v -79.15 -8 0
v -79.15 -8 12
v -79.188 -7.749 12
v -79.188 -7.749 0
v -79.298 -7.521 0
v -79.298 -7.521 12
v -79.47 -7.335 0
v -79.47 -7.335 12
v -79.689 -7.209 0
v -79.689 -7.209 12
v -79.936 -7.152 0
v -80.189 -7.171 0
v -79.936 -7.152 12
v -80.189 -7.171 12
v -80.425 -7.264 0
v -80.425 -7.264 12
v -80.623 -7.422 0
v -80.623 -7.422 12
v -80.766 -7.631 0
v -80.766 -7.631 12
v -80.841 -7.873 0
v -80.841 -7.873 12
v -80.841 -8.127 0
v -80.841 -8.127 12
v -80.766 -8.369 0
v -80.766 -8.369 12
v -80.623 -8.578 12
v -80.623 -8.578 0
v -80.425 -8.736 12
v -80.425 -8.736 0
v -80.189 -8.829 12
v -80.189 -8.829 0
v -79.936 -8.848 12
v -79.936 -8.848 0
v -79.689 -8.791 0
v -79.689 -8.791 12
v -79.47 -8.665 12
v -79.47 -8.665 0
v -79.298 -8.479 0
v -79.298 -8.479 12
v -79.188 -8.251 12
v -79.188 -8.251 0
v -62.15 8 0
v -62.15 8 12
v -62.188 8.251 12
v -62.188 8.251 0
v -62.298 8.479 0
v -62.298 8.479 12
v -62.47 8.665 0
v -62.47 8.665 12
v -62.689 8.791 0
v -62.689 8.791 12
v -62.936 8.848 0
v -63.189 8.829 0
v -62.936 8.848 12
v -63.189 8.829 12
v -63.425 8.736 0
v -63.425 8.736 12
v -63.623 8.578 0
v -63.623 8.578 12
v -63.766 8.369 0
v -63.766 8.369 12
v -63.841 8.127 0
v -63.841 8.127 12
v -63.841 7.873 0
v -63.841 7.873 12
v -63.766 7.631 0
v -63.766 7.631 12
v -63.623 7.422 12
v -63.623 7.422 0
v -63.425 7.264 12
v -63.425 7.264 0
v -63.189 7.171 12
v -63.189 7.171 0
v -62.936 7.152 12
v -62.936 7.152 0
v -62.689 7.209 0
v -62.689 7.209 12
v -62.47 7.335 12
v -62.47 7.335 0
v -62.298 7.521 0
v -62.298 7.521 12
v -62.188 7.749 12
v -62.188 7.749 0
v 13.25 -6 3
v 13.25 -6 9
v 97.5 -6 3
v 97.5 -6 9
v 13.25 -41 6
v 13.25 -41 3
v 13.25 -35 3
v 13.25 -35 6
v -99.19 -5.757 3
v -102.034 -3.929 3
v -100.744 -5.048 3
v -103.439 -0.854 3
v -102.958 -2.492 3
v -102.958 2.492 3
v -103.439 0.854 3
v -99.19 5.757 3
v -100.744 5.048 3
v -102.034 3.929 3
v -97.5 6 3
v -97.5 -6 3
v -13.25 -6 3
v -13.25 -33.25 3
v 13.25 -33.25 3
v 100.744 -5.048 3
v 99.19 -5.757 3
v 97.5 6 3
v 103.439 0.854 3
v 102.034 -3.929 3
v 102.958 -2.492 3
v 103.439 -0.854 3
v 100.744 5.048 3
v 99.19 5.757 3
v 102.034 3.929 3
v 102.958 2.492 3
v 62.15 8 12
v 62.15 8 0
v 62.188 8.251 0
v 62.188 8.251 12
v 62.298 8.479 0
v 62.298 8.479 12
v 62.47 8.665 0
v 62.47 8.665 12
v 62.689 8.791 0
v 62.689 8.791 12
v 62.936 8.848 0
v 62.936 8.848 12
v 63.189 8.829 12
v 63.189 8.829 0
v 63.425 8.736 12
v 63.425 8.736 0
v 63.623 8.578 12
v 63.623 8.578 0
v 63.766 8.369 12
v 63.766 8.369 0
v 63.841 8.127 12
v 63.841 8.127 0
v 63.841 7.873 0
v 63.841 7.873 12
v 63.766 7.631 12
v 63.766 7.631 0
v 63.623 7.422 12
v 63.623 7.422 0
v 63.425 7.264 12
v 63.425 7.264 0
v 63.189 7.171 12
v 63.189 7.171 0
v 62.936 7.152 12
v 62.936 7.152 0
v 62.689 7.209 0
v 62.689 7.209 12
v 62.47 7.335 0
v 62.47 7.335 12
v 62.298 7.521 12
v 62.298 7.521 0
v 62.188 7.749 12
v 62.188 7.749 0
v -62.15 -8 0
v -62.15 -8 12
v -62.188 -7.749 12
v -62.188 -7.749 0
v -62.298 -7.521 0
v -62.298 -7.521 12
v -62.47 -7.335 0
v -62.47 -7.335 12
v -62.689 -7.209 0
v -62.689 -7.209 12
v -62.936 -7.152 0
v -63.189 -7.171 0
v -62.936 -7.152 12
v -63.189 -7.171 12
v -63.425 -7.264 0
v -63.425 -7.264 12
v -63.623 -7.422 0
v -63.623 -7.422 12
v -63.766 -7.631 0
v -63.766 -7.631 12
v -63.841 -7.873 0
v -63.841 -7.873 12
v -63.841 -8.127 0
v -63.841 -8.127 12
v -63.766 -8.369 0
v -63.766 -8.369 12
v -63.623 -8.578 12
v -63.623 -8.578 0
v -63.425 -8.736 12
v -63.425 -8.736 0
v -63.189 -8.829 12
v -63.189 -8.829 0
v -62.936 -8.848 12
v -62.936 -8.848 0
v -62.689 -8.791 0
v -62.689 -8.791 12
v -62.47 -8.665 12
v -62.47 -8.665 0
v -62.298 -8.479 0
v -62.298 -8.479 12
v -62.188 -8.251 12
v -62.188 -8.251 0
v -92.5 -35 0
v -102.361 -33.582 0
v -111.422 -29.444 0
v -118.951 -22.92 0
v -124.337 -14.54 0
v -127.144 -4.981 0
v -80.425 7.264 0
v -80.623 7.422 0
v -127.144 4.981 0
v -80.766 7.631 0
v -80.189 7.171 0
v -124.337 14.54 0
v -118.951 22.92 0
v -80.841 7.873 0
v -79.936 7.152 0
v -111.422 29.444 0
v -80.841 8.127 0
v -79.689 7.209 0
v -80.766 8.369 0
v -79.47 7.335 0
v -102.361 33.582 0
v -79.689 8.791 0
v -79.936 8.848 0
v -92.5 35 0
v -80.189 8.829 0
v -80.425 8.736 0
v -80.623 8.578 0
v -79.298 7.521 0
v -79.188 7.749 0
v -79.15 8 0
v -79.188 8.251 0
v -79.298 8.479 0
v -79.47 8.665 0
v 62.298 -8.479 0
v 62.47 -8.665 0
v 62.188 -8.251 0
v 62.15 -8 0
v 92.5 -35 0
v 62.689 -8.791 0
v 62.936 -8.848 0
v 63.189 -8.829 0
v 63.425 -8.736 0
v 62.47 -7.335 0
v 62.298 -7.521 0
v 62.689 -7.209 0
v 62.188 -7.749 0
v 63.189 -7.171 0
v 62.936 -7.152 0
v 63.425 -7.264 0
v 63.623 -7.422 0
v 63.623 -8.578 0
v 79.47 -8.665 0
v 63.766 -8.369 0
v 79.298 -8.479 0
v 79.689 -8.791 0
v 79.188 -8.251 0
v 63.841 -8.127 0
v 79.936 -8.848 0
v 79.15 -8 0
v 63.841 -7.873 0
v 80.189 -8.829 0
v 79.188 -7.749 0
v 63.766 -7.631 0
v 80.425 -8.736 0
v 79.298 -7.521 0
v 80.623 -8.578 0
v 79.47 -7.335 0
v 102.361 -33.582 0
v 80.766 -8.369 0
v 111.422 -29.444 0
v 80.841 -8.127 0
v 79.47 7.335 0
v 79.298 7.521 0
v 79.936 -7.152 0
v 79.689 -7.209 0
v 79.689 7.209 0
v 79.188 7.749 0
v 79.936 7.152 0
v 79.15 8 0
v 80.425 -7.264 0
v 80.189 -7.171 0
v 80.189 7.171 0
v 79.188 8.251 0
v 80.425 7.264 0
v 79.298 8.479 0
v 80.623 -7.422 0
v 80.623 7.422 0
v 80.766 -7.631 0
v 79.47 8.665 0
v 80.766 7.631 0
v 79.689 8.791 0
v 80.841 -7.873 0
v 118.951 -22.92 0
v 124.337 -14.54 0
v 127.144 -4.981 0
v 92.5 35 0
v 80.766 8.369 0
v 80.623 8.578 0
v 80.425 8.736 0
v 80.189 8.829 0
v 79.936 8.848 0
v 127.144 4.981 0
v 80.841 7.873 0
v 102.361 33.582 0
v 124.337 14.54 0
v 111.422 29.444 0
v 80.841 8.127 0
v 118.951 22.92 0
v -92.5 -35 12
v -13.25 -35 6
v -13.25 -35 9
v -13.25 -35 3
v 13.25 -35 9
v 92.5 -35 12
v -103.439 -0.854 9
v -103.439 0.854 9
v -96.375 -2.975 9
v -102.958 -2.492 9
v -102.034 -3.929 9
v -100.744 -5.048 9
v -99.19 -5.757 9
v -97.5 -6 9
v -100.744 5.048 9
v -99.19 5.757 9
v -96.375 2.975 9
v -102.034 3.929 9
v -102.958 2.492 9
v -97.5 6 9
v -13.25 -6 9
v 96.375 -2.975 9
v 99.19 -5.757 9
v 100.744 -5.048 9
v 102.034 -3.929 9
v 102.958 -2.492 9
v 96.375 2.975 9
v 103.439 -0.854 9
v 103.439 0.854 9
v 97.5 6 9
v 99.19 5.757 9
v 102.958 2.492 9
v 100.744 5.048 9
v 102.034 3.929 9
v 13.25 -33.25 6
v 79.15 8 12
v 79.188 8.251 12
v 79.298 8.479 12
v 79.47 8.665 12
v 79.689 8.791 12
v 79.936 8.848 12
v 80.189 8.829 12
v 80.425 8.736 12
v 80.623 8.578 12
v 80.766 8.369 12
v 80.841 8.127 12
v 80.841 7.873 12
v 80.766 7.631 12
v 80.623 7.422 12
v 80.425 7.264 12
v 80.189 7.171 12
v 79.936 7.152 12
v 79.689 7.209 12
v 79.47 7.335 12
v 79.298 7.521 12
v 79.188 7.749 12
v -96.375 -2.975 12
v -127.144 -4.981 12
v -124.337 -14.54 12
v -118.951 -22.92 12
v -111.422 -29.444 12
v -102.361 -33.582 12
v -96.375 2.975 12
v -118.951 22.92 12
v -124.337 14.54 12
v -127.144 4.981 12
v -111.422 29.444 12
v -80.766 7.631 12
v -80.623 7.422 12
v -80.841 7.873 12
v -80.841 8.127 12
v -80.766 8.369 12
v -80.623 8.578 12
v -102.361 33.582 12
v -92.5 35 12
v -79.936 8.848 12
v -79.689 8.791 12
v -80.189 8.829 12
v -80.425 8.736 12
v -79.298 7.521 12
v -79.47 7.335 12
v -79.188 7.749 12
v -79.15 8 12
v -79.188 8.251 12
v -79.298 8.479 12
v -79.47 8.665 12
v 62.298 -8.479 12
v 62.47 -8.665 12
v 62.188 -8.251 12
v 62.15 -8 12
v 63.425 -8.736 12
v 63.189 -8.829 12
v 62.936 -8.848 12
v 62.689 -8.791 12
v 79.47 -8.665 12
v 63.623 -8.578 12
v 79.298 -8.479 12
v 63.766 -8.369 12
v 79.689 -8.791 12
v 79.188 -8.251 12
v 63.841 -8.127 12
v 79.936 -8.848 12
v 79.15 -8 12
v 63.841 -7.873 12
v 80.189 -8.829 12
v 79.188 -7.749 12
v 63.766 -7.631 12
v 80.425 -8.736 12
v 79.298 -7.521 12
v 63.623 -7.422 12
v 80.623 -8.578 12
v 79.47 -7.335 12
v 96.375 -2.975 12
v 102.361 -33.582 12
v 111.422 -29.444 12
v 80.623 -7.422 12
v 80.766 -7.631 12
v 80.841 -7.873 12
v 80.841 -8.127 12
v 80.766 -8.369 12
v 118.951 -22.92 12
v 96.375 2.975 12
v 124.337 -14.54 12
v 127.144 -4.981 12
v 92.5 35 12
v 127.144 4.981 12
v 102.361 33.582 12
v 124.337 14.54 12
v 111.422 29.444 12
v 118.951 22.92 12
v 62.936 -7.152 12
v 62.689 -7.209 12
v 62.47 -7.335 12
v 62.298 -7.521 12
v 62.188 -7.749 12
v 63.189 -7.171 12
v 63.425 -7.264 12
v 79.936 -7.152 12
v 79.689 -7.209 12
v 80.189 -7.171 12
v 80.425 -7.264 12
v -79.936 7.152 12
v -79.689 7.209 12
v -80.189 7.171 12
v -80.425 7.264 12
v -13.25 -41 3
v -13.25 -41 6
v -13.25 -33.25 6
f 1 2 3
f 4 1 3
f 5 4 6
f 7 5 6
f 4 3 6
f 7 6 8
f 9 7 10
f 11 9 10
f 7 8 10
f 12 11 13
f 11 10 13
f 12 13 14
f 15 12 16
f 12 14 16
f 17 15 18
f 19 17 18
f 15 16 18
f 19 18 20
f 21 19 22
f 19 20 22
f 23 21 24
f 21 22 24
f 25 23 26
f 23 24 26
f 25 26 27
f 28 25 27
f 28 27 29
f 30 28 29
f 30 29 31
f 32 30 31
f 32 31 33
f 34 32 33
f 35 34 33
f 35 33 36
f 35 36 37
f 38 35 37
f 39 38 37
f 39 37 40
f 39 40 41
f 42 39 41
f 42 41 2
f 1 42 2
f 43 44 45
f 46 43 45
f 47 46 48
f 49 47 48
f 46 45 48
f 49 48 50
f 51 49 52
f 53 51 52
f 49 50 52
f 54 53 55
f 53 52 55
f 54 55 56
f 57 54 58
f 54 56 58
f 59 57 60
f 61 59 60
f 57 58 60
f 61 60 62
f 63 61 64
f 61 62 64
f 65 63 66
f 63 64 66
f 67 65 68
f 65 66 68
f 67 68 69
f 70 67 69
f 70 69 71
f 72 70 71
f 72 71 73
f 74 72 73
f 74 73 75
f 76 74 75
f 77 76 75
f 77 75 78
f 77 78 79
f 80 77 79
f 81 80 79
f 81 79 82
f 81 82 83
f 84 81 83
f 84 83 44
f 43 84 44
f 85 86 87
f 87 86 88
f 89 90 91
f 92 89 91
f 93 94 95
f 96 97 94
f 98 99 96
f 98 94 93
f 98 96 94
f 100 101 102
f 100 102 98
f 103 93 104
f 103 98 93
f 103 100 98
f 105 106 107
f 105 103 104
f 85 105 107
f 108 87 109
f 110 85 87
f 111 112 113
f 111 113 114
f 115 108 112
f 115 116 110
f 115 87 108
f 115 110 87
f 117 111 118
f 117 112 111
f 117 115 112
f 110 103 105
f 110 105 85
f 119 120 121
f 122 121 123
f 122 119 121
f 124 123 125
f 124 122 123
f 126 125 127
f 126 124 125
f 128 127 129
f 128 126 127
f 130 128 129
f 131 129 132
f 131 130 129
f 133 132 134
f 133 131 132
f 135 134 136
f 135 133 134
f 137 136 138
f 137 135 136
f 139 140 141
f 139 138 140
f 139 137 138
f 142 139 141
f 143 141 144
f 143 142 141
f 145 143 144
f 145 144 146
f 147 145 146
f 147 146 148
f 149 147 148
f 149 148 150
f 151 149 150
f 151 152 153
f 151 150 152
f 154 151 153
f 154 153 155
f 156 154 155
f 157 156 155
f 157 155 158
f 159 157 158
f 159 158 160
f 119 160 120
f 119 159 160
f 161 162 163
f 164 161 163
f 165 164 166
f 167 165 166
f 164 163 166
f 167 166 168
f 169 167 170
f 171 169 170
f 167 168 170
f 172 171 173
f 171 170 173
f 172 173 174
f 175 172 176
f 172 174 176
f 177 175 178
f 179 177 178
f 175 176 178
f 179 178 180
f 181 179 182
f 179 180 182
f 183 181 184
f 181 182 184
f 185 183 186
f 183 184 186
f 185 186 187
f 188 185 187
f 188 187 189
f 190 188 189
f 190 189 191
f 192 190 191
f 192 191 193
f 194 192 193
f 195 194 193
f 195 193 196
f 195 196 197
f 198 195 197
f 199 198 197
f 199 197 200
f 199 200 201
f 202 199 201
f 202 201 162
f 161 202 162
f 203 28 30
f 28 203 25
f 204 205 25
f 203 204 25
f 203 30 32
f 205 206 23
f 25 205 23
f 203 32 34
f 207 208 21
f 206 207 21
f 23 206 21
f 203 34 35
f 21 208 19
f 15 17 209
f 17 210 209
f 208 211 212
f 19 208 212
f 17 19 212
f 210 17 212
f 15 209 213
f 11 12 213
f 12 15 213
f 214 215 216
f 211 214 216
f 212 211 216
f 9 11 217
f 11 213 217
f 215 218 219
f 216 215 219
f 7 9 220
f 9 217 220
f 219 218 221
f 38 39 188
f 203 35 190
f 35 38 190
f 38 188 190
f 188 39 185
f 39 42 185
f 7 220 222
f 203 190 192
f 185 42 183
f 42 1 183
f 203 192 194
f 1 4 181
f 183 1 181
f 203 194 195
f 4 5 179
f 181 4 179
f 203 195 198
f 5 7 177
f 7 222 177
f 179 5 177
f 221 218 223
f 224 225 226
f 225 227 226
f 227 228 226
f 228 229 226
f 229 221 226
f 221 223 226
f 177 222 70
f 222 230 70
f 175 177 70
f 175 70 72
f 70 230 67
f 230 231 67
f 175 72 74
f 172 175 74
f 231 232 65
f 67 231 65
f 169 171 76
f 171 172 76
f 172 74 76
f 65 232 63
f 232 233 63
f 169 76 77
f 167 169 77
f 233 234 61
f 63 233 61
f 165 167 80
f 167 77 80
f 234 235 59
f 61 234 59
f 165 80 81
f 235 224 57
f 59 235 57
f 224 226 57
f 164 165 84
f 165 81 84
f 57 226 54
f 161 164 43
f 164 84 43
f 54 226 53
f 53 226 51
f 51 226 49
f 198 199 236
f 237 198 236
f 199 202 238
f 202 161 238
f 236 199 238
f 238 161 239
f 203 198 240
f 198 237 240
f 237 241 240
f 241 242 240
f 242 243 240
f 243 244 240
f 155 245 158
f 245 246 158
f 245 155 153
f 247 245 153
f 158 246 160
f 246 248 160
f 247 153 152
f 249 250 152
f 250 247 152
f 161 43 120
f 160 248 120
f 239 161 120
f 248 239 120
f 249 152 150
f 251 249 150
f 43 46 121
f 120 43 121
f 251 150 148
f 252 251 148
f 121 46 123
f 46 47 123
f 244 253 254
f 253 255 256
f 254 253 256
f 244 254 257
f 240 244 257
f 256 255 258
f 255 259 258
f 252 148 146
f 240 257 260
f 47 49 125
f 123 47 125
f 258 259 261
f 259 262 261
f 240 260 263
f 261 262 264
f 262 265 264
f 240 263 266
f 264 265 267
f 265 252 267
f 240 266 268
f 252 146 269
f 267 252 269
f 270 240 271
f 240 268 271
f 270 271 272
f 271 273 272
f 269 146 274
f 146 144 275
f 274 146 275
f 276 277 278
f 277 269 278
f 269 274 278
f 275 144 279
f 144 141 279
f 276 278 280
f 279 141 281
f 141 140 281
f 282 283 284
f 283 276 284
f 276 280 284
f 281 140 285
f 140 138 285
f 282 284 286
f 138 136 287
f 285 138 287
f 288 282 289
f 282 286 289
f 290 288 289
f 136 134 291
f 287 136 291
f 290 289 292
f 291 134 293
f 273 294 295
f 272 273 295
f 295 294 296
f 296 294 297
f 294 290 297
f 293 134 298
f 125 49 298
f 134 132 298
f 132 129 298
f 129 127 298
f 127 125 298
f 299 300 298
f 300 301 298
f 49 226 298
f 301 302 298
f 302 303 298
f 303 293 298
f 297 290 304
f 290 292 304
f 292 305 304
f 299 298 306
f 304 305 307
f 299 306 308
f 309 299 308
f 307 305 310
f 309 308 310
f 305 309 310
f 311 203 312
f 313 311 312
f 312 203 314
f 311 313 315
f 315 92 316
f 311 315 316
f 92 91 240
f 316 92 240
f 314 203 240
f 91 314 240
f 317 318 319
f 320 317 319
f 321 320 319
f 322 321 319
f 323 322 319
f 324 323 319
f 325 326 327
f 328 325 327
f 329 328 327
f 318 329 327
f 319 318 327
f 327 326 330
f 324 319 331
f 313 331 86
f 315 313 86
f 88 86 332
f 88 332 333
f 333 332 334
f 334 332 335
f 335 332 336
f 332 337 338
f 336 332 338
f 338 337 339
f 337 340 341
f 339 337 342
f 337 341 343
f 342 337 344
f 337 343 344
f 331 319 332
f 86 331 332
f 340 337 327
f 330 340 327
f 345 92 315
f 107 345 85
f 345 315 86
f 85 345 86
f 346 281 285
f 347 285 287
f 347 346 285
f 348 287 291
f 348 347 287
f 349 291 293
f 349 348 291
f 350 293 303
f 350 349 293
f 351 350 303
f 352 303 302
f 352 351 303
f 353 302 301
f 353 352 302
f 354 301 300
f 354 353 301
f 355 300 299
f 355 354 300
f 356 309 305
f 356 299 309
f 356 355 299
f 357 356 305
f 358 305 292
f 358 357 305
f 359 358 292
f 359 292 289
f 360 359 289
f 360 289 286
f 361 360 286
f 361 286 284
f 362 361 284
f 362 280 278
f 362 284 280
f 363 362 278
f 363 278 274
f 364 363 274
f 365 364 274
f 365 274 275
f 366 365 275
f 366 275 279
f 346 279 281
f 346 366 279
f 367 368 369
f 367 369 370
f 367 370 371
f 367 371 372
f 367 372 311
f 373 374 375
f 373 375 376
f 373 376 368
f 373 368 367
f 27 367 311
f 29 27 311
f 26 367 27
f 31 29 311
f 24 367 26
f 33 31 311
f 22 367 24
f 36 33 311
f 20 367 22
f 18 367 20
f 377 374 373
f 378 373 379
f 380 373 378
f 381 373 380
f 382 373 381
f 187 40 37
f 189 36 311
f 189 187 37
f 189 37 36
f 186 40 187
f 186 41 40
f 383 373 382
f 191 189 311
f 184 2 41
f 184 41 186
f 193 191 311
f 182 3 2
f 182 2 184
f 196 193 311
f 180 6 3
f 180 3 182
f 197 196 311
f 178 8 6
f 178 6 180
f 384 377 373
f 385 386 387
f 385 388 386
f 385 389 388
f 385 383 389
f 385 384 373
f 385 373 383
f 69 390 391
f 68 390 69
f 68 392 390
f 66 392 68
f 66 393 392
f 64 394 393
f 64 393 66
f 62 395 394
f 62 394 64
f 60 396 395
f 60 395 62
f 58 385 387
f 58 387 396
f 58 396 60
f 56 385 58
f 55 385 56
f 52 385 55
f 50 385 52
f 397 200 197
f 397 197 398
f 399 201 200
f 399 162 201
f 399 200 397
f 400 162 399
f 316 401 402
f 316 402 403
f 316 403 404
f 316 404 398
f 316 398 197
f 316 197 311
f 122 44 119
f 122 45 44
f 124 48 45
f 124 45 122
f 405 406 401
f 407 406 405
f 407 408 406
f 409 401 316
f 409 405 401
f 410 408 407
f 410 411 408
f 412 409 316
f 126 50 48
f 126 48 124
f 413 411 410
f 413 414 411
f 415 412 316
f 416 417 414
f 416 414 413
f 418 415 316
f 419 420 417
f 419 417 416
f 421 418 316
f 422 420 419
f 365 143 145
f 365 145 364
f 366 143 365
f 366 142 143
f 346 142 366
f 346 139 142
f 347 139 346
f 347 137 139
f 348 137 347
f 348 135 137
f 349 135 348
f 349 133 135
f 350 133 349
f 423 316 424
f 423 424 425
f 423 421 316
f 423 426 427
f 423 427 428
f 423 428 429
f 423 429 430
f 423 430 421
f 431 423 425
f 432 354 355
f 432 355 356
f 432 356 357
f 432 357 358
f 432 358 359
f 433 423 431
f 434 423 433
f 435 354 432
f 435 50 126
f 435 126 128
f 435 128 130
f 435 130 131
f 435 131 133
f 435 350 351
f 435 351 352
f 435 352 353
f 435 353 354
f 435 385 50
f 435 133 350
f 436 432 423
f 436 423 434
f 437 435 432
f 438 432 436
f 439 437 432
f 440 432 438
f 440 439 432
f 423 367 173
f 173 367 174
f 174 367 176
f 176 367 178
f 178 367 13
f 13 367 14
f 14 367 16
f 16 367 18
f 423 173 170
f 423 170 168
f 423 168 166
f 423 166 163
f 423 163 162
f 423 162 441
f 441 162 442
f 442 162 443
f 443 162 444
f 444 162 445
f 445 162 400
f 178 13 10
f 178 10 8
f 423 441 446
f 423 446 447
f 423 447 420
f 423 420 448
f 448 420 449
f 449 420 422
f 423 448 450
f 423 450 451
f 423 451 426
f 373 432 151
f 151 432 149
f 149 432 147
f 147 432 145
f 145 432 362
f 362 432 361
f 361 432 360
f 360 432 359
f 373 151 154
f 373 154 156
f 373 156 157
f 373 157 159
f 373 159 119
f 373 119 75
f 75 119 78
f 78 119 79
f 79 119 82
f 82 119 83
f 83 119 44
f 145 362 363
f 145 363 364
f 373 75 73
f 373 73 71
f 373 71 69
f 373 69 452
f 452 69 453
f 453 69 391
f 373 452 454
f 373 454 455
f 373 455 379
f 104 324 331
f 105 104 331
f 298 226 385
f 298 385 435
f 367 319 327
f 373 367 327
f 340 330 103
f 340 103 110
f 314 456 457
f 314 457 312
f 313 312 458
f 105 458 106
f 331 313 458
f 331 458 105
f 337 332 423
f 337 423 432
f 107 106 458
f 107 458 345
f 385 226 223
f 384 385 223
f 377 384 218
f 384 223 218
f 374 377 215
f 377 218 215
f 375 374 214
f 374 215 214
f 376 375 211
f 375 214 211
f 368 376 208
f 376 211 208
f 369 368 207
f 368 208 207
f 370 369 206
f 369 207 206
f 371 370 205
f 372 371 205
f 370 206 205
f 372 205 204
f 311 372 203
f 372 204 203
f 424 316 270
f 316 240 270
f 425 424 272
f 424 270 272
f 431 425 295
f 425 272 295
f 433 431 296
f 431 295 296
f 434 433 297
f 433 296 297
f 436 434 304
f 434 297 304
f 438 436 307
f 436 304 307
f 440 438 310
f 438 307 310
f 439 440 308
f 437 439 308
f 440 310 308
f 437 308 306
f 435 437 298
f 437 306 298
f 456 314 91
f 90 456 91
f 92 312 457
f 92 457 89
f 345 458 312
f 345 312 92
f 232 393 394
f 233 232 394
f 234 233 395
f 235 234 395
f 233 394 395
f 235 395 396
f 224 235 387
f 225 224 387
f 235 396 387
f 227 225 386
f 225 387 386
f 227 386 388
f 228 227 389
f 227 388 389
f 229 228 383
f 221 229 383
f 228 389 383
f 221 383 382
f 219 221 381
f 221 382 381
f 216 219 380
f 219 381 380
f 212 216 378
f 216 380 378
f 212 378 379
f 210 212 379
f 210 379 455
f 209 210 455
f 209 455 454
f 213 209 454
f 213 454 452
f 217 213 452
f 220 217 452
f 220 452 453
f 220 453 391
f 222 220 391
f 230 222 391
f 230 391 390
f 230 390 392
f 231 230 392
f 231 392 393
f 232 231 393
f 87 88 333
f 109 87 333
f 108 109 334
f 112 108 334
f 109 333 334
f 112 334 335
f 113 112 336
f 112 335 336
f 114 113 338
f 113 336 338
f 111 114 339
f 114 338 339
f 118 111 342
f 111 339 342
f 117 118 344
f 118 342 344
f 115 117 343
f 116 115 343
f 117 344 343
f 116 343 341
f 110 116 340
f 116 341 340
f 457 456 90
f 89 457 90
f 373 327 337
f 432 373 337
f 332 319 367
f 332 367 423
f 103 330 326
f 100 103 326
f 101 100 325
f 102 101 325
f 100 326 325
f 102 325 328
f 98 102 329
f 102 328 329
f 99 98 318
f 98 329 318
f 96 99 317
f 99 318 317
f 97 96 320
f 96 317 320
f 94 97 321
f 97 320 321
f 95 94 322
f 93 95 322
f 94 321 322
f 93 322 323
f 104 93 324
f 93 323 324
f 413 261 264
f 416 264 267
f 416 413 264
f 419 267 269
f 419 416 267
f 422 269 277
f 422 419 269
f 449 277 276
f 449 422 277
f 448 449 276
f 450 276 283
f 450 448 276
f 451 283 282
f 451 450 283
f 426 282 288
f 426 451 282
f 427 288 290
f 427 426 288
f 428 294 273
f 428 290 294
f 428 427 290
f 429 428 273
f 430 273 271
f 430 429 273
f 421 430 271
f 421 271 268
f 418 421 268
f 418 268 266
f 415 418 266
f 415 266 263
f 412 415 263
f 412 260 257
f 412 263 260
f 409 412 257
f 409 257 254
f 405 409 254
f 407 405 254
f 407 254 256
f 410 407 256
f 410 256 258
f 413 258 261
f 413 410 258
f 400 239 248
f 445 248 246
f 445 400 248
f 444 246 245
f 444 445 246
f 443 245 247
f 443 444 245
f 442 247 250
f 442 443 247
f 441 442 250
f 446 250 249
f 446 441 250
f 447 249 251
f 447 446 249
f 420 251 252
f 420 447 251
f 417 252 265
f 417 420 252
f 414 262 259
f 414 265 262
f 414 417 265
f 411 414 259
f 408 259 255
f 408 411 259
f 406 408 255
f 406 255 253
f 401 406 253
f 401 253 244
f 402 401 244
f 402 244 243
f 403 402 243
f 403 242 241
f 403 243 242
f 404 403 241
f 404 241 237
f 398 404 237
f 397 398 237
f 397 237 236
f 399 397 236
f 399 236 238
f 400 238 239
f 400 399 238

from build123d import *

# Parameters (mm, degrees)
PAD_DEPTH       = 9
POCKET_DEPTH    = 6
SKETCH002_W     = 26.5
SKETCH002_H     = 35
POCKET001_DEPTH = 6
SKETCH003_W     = 192.75
SKETCH003_H     = 5.95
PAD001_DEPTH    = 3
SKETCH004_R     = 0.85
POCKET002_DEPTH = 541.411993
SKETCH005_W     = 26.5
SKETCH005_H     = 7.75
PAD002_DEPTH    = 3


with BuildPart() as part:
    # Sketch → Pad (new body)
    with BuildSketch(Plane.XY):
        with BuildLine():
            ThreePointArc((-92.5, 35), (-127.5, 0), (-92.5, -35))
            Line((-92.5, -35), (92.5, -35))
            ThreePointArc((92.5, -35), (127.5, 0), (92.5, 35))
            Line((-92.5, 35), (92.5, 35))
        make_face()
    extrude(amount=PAD_DEPTH)

    # Sketch001 (on Face6 of Pad) → Pocket (cut)
    with BuildSketch(Plane.XY.offset(9)):
        with BuildLine():
            ThreePointArc((-97.5, 6), (-103.5, 0), (-97.5, -6))
            Line((-97.5, -6), (97.5, -6))
            ThreePointArc((97.5, -6), (103.5, 0), (97.5, 6))
            Line((-97.5, 6), (97.5, 6))
        make_face()
    extrude(amount=-POCKET_DEPTH, mode=Mode.SUBTRACT)

    # Sketch002 (on Face5 of Pocket) → Pocket001 (cut)
    with BuildSketch(Plane.XY.offset(9)):
        with Locations((0, -17.5)):
            Rectangle(SKETCH002_W, SKETCH002_H)
    extrude(amount=-POCKET001_DEPTH, mode=Mode.SUBTRACT)

    # Sketch003 (on Face5 of Pocket001) → Pad001 (join)
    with BuildSketch(Plane.XY.offset(9)):
        with BuildLine():
            ThreePointArc((-92.5, 35), (-127.5, 0), (-92.5, -35))
            Line((-92.5, -35), (92.5, -35))
            ThreePointArc((92.5, -35), (127.5, 0), (92.5, 35))
            Line((-92.5, 35), (92.5, 35))
        make_face()
        Rectangle(SKETCH003_W, SKETCH003_H, mode=Mode.SUBTRACT)
    extrude(amount=PAD001_DEPTH)

    # Sketch004 (on Face12 of Pad001) → Pocket002 (cut, through all)
    with BuildSketch(Plane.XY.offset(12)):
        with Locations((-80, -8)):
            Circle(SKETCH004_R)
        with Locations((-63, -8)):
            Circle(SKETCH004_R)
        with Locations((-63, 8)):
            Circle(SKETCH004_R)
        with Locations((-80, 8)):
            Circle(SKETCH004_R)
    pocket002 = extrude(amount=-POCKET002_DEPTH, mode=Mode.SUBTRACT)

    # Sketch005 (on Face10 of Pocket002) → Pad002 (join)
    with BuildSketch(Plane.XY.offset(3)):
        with Locations((0, -37.125)):
            Rectangle(SKETCH005_W, SKETCH005_H)
    extrude(amount=PAD002_DEPTH)

    # Mirrored: Pocket002 across Sketch004 V_Axis
    add(pocket002.mirror(Plane(origin=(0, 0, 12), x_dir=(0, 0, 1), z_dir=(1, 0, 0))), mode=Mode.SUBTRACT)


solid = part.part
